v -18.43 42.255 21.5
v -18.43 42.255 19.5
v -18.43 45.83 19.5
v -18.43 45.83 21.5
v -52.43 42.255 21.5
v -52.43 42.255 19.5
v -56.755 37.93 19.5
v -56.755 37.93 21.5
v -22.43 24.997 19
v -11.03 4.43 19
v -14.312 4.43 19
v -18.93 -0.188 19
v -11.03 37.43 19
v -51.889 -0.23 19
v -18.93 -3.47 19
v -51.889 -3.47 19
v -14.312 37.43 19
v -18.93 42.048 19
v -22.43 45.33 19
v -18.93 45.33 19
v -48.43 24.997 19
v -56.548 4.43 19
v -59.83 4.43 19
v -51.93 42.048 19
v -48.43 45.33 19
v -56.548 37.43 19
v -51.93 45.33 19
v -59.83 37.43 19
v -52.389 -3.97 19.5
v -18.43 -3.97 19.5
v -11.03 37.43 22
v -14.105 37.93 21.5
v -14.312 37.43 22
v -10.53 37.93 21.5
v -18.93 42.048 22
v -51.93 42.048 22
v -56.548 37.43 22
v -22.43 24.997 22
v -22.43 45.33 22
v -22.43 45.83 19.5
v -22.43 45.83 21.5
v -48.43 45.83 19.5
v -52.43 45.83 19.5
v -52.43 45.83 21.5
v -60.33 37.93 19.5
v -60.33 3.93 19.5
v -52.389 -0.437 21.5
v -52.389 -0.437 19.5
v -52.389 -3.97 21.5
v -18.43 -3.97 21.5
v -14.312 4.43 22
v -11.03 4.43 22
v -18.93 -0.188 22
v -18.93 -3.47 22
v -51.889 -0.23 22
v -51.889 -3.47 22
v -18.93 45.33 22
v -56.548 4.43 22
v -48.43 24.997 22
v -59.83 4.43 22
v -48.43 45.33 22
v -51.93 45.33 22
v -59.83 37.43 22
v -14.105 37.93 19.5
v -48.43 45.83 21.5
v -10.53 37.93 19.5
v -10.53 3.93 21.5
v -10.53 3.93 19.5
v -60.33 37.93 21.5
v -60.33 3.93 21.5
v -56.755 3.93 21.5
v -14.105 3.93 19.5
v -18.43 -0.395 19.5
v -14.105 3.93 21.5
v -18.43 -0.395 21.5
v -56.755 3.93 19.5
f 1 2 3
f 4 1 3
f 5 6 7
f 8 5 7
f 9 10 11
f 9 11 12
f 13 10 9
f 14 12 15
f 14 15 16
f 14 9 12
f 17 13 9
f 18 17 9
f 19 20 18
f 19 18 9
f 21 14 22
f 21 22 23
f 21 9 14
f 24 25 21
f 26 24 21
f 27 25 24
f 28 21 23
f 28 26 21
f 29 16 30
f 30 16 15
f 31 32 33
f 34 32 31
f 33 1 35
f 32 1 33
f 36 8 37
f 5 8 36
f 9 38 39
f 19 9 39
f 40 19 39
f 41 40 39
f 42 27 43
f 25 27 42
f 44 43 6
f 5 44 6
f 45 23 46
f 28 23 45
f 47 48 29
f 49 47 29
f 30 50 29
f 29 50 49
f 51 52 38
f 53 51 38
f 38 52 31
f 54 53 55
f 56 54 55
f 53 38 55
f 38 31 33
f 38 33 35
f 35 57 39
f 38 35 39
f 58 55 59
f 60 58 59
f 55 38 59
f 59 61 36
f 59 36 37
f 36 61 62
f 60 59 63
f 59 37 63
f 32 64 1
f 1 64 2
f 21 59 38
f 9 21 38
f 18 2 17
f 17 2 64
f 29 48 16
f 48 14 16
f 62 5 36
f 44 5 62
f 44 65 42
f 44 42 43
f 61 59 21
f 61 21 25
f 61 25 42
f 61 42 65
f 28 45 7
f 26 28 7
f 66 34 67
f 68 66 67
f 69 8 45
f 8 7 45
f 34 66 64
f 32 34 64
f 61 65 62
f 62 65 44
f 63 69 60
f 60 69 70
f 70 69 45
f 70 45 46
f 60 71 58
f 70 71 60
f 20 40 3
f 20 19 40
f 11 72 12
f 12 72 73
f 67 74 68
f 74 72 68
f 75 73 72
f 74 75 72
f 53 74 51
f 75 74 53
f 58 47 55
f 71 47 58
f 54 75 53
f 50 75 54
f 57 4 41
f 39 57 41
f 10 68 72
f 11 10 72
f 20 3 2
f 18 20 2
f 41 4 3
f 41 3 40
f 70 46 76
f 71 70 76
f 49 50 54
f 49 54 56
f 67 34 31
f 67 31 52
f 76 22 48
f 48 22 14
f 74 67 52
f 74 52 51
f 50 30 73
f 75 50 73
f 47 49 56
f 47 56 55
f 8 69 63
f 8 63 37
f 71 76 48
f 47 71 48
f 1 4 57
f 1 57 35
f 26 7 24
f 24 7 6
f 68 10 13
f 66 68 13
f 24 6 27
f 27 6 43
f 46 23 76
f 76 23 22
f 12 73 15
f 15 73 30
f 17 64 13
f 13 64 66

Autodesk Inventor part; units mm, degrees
ref_plane "YZ Plane" through (0, 0, 0) normal (1, 0, 0) x (0, 1, 0)
ref_plane "XZ Plane" through (0, 0, 0) normal (0, 1, 0) x (-1, 0, 0)
ref_plane "Work Plane1" through (-56.3599, 0, 22) normal (0, 0, -1) x (-1, 0, 0)
sketch "Sketch1" plane through (-56.3599, 0, 22) normal (0, 0, -1) x (-1, 0, 0)
  line L0 (-4.0299, -0.3538) -> (-2.2322, 1.4439) construction
  arc A0 (-1.4439, 2.2322) -> (-2.2322, 1.4439) centre (-0.9299, 0.9299) ccw construction
  line L1 (-1.4439, 2.2322) -> (0.3538, 4.0299) construction
  line L2 (-37.8299, 42.8299) -> (-37.8299, 37.8299) construction
  line L3 (-37.8299, 37.8299) -> (-42.9208, 37.8299) construction
  line L4 (-37.8299, 42.2137) -> (-37.8299, 45.8299) construction
  line L5 (-37.8299, 45.8299) -> (-4.0299, 45.8299) construction
  line L6 (-4.0299, 45.8299) -> (-4.0299, 42.2137) construction
  line L7 (-4.0299, 4.0299) -> (0.3538, 4.0299) projected
  circle A1 centre (-20.9299, 20.9299) radius 17.5 projected
  line L8 (-20.9299, 58.9723) -> (17.1124, 20.9299) construction
  line L9 (17.1124, 20.9299) -> (-20.9299, -17.1124) construction
  line L10 (-20.9299, -17.1124) -> (-58.9723, 20.9299) construction
  line L11 (-58.9723, 20.9299) -> (-20.9299, 58.9723) construction
  line L12 (-20.9299, 58.9723) -> (-20.9299, -17.1124) construction
  line L13 (17.1124, 20.9299) -> (-58.9723, 20.9299) construction
  line L14 (-20.9299, 58.9723) -> (32.8701, 58.9723) construction
  line L15 (-43.4299, 43.4299) -> (1.5701, 43.4299) construction
  line L16 (1.5701, 43.4299) -> (1.5701, -1.5701) construction
  line L17 (1.5701, -1.5701) -> (-43.4299, -1.5701) construction
  line L18 (-43.4299, -1.5701) -> (-43.4299, 43.4299) construction
  line L19 (-43.4299, 43.4299) -> (1.5701, -1.5701) construction
  line L20 (1.5701, 43.4299) -> (-43.4299, -1.5701) construction
  line L21 (-43.4299, 5.3876) -> (-43.4299, 36.4723)
  line L22 (-43.4299, 36.4723) -> (-36.4723, 43.4299)
  line L23 (-36.4723, 43.4299) -> (-5.3876, 43.4299)
  line L24 (-5.3876, 43.4299) -> (1.5701, 36.4723)
  line L25 (1.5701, 36.4723) -> (1.5701, 5.3876)
  line L26 (1.5701, 5.3876) -> (-5.3876, -1.5701)
  line L27 (-5.3876, -1.5701) -> (-36.4723, -1.5701)
  line L28 (-36.4723, -1.5701) -> (-43.4299, 5.3876)
  line L29 (-4.0299, 42.2137) -> (-37.8299, 42.2137) projected
  line L30 (-4.0299, -0.3538) -> (-4.0299, 4.0299) projected
  circle A2 centre (-20.9299, 20.9299) radius 1.5
  line L31 (-10.9299, 10.9299) -> (-30.9299, 10.9299) construction
  line L32 (-30.9299, 10.9299) -> (-30.9299, 30.9299) construction
  line L33 (-30.9299, 30.9299) -> (-10.9299, 30.9299) construction
  line L34 (-10.9299, 30.9299) -> (-10.9299, 10.9299) construction
  line L35 (-10.9299, 10.9299) -> (-30.9299, 30.9299) construction
  line L36 (-30.9299, 10.9299) -> (-10.9299, 30.9299) construction
  circle A3 centre (-30.9299, 30.9299) radius 1.4
  circle A4 centre (-30.9299, 10.9299) radius 1.4
  circle A5 centre (-10.9299, 10.9299) radius 1.4
  line L37 (-45.8299, 37.8299) -> (-42.0723, 37.8299) construction
  line L38 (-42.1723, 37.7299) -> (-45.8299, 37.7299)
  line L39 (-45.8299, 37.7299) -> (-45.8299, 4.1299)
  line L40 (-45.8299, 4.1299) -> (-42.1723, 4.1299)
  line L41 (-42.1723, 4.1299) -> (-42.1723, 37.7299)
  line L42 (-45.8299, 4.0299) -> (-42.0723, 4.0299) construction
  line L43 (-45.8299, 37.8299) -> (-42.0723, 37.8299) projected
  line L44 (-37.7299, 45.8299) -> (-4.1299, 45.8299)
  line L45 (-4.1299, 45.8299) -> (-4.1299, 42.1723)
  line L46 (-4.1299, 42.1723) -> (-37.7299, 42.1723)
  line L47 (-37.7299, 42.1723) -> (-37.7299, 45.8299)
  line L48 (0.4701, 37.8299) -> (0.4701, 4.0299) construction
  line L49 (0.4701, 4.0299) -> (3.9701, 4.0299) construction
  line L50 (3.9701, 37.8299) -> (3.9701, 4.0299) construction
  line L51 (0.4701, 37.8299) -> (3.9701, 37.8299) construction
  line L52 (-45.8299, -3.9701) -> (-4.0299, -3.9701) construction
  line L53 (0.3124, 37.7299) -> (3.9701, 37.7299)
  line L54 (3.9701, 37.7299) -> (3.9701, 4.1299)
  line L55 (3.9701, 4.1299) -> (0.3124, 4.1299)
  line L56 (0.3124, 4.1299) -> (0.3124, 37.7299)
  line L57 (-4.1713, -0.3538) -> (-37.7299, -0.3538)
  line L58 (-37.7299, -0.3538) -> (-37.7299, -3.9701)
  line L59 (-37.7299, -3.9701) -> (-4.1713, -3.9701)
  line L60 (-4.1713, -3.9701) -> (-4.1713, -0.3538)
  point P0 (-37.8299, 4.0299)
  dimension "d18" = 53.8
  dimension "d19" = 45
  dimension "d20" = 53.8
  dimension "d21" = 45
  dimension "d22" = 45
  dimension "d30" = 20
  dimension "d31" = 20
  dimension "d32" = 2.8
  dimension "d33" = 2.8
  dimension "d34" = 2.8
  dimension "d35" = 3
  dimension "d36" = 0.1
  dimension "d37" = 0.1
  dimension "d38" = 0.1
  dimension "d39" = 0.1
extrude "Extrusion1" add sketch "Sketch1" along normal blind 3 contours L30 L26 L57 L28 L41 L22 L46 L24 L56 L7 | L7 L26 L30 | L56 L24 L25 L26 | L26 L25 L24 L53 L54 L55 | L60 L59 L58 L57 L28 L27 L26 | L26 L27 L28 L57 | L46 L22 L29 L24 | L24 L29 L45 | L40 L39 L38 L22 L21 L28 | L28 L21 L22 L41 | L29 L22 L23 L24 | L24 L23 L22 L29 L47 L44 L45 | L47 L29 L22 | A1 | A2 | A3 | A4 | A5
sketch "Skizze4" plane through (-56.3599, 0, 19) normal (0, 0, -1) x (-1, 0, 0)
  line L0 (-37.7299, 42.1723) -> (-42.1723, 37.7299) projected
  line L1 (-42.1723, 37.7299) -> (-45.8299, 37.7299) projected
  line L2 (-45.8299, 37.7299) -> (-45.8299, 4.1299) construction
  line L3 (-45.8299, 4.1299) -> (-42.1723, 4.1299) projected
  line L4 (-42.1723, 4.1299) -> (-37.6885, -0.3538) projected
  line L5 (-37.6885, -0.3538) -> (-37.7299, -0.3538) projected
  line L6 (-37.7299, -0.3538) -> (-37.7299, -3.9701) projected
  line L7 (-37.7299, -3.9701) -> (-4.1713, -3.9701) construction
  line L8 (-4.1713, -3.9701) -> (-4.1713, -0.3538) projected
  line L9 (-4.1713, -0.3538) -> (0.3124, 4.1299) projected
  line L10 (0.3124, 4.1299) -> (3.9701, 4.1299) projected
  line L11 (3.9701, 4.1299) -> (3.9701, 37.7299) construction
  line L12 (3.9701, 37.7299) -> (0.3124, 37.7299) projected
  line L13 (0.3124, 37.7299) -> (-4.1299, 42.1723) projected
  line L14 (-4.1299, 42.1723) -> (-4.1299, 45.8299) projected
  line L15 (-4.1299, 45.8299) -> (-37.7299, 45.8299) construction
  line L16 (-37.7299, 45.8299) -> (-37.7299, 42.1723) projected
  line L17 (-37.9299, 46.0299) -> (-3.9299, 46.0299) construction
  line L18 (-3.9299, 46.0299) -> (-3.9299, 42.2551)
  line L19 (-3.9299, 42.2551) -> (0.3953, 37.9299)
  line L20 (0.3953, 37.9299) -> (4.1701, 37.9299)
  line L21 (4.1701, 37.9299) -> (4.1701, 3.9299) construction
  line L22 (4.1701, 3.9299) -> (0.3953, 3.9299)
  line L23 (0.3953, 3.9299) -> (-3.9713, -0.4367)
  line L24 (-3.9713, -0.4367) -> (-3.9713, -4.1701)
  line L25 (-3.9713, -4.1701) -> (-37.9299, -4.1701) construction
  line L26 (-37.9299, -4.1701) -> (-37.9299, -0.3953)
  line L27 (-37.9299, -0.3953) -> (-42.2551, 3.9299)
  line L28 (-42.2551, 3.9299) -> (-46.0299, 3.9299)
  line L29 (-46.0299, 3.9299) -> (-46.0299, 37.9299) construction
  line L30 (-46.0299, 37.9299) -> (-42.2551, 37.9299)
  line L31 (-42.2551, 37.9299) -> (-37.9299, 42.2551)
  line L32 (-37.9299, 42.2551) -> (-37.9299, 46.0299)
  line L33 (-45.8299, 37.7299) -> (-45.8299, 37.9299)
  line L34 (-4.1299, 45.8299) -> (-37.7299, 45.8299) projected
  line L35 (-37.7299, 45.8299) -> (-37.9299, 45.8299)
  line L36 (-4.1299, 45.8299) -> (-3.9299, 45.8299)
  line L37 (3.9701, 37.7299) -> (3.9701, 37.9299)
  line L38 (3.9701, 4.1299) -> (3.9701, 37.7299) projected
  line L39 (3.9701, 4.1299) -> (3.9701, 3.9299)
  line L40 (-4.1713, -3.9701) -> (-3.9713, -3.9701)
  line L41 (-37.7299, -3.9701) -> (-37.9299, -3.9701)
  line L42 (-45.8299, 4.1299) -> (-45.8299, 3.9299)
  point P0 (-56.3599, 0)
  dimension "d40" = 0.2
extrude "IM_offset" add sketch "Skizze4" against normal up to surface (3 mm away)
ref_plane "Arbeitsebene5" through (-35.4299, 3.9299, 22) normal (-1, 0, 0) x (0, 0, 1)
ref_plane "Arbeitsebene6" through (-18.4299, 20.9299, 22) normal (0, 1, 0) x (-1, 0, 0)
chamfer "Fase2" distance 0.5 angle 45 32 edges at (-35.4299, 45.8299, 22) (-18.4299, 44.0425, 22) (-16.2673, 40.0925, 22) (-12.3173, 37.9299, 22) (-10.5299, 20.9299, 22) (-12.3173, 3.9299, 22) (-16.2673, 1.7673, 22) (-18.4299, -2.1827, 22) (-35.4092, -3.9701, 22) (-52.3885, -2.2034, 22) (-54.5718, 1.7466, 22) (-58.5425, 3.9299, 22) (-60.3299, 20.9299, 22) (-58.5425, 37.9299, 22) (-54.5925, 40.0925, 22) (-54.5718, 1.7466, 19) (-58.5425, 3.9299, 19) (-60.3299, 20.9299, 19) (-52.3885, -2.2034, 19) (-35.4092, -3.9701, 19) (-18.4299, -2.1827, 19) (-16.2673, 1.7673, 19) (-12.3173, 3.9299, 19) (-10.5299, 20.9299, 19) (-12.3173, 37.9299, 19) (-16.2673, 40.0925, 19) (-18.4299, 44.0425, 19) (-35.4299, 45.8299, 19) (-52.4299, 44.0425, 19) (-54.5925, 40.0925, 19) (-58.5425, 37.9299, 19) (-52.4299, 44.0425, 22)
sketch "Skizze33" plane through (-56.3599, 0, 22) normal (0, 0, 1) x (1, 0, 0)
  line L0 (35.9299, 55.1649) -> (35.9299, -0.2255) projected
  line L1 (35.9299, 55.1649) -> (20.9299, 55.1649) projected
  line L2 (20.9299, 55.1649) -> (20.9299, 47.7466) projected
  line L3 (33.9299, 47.7466) -> (20.9299, 47.7466) projected
  line L4 (33.9299, 24.9969) -> (33.9299, 47.7466) projected
  line L5 (20.9299, 24.9969) -> (33.9299, 24.9969) projected
  line L6 (20.9299, 24.9969) -> (20.9299, 20.7437) projected
  line L7 (22.9299, 20.7437) -> (20.9299, 20.7437) projected
  line L8 (22.9299, 17.3807) -> (22.9299, 20.7437) projected
  line L9 (20.9299, 17.3807) -> (22.9299, 17.3807) projected
  line L10 (20.9299, 17.3807) -> (20.9299, -0.2255) projected
  line L11 (35.9299, -0.2255) -> (20.9299, -0.2255) projected
  line L12 (20.9299, 24.9969) -> (33.9299, 24.9969)
  line L13 (33.9299, 24.9969) -> (33.9299, 47.7466)
  line L14 (33.9299, 47.7466) -> (20.9299, 47.7466)
  line L15 (20.9299, 47.7466) -> (20.9299, 24.9969)
  line L16 (20.9299, 24.9969) -> (7.9299, 24.9969)
  line L17 (7.9299, 24.9969) -> (7.9299, 47.7466)
  line L18 (7.9299, 47.7466) -> (20.9299, 47.7466)
  line L19 (20.9299, 47.7466) -> (20.9299, 24.9969)
  point P0 (56.3599, 0)
  dimension "d189" = 13
extrude "Extrusion28" cut sketch "Skizze33" against normal blind 3 contours L3 L4 L5 L15 | L15 L16 L17 L18
properties part number "20_Cube_Insert_Filter_25mm"
